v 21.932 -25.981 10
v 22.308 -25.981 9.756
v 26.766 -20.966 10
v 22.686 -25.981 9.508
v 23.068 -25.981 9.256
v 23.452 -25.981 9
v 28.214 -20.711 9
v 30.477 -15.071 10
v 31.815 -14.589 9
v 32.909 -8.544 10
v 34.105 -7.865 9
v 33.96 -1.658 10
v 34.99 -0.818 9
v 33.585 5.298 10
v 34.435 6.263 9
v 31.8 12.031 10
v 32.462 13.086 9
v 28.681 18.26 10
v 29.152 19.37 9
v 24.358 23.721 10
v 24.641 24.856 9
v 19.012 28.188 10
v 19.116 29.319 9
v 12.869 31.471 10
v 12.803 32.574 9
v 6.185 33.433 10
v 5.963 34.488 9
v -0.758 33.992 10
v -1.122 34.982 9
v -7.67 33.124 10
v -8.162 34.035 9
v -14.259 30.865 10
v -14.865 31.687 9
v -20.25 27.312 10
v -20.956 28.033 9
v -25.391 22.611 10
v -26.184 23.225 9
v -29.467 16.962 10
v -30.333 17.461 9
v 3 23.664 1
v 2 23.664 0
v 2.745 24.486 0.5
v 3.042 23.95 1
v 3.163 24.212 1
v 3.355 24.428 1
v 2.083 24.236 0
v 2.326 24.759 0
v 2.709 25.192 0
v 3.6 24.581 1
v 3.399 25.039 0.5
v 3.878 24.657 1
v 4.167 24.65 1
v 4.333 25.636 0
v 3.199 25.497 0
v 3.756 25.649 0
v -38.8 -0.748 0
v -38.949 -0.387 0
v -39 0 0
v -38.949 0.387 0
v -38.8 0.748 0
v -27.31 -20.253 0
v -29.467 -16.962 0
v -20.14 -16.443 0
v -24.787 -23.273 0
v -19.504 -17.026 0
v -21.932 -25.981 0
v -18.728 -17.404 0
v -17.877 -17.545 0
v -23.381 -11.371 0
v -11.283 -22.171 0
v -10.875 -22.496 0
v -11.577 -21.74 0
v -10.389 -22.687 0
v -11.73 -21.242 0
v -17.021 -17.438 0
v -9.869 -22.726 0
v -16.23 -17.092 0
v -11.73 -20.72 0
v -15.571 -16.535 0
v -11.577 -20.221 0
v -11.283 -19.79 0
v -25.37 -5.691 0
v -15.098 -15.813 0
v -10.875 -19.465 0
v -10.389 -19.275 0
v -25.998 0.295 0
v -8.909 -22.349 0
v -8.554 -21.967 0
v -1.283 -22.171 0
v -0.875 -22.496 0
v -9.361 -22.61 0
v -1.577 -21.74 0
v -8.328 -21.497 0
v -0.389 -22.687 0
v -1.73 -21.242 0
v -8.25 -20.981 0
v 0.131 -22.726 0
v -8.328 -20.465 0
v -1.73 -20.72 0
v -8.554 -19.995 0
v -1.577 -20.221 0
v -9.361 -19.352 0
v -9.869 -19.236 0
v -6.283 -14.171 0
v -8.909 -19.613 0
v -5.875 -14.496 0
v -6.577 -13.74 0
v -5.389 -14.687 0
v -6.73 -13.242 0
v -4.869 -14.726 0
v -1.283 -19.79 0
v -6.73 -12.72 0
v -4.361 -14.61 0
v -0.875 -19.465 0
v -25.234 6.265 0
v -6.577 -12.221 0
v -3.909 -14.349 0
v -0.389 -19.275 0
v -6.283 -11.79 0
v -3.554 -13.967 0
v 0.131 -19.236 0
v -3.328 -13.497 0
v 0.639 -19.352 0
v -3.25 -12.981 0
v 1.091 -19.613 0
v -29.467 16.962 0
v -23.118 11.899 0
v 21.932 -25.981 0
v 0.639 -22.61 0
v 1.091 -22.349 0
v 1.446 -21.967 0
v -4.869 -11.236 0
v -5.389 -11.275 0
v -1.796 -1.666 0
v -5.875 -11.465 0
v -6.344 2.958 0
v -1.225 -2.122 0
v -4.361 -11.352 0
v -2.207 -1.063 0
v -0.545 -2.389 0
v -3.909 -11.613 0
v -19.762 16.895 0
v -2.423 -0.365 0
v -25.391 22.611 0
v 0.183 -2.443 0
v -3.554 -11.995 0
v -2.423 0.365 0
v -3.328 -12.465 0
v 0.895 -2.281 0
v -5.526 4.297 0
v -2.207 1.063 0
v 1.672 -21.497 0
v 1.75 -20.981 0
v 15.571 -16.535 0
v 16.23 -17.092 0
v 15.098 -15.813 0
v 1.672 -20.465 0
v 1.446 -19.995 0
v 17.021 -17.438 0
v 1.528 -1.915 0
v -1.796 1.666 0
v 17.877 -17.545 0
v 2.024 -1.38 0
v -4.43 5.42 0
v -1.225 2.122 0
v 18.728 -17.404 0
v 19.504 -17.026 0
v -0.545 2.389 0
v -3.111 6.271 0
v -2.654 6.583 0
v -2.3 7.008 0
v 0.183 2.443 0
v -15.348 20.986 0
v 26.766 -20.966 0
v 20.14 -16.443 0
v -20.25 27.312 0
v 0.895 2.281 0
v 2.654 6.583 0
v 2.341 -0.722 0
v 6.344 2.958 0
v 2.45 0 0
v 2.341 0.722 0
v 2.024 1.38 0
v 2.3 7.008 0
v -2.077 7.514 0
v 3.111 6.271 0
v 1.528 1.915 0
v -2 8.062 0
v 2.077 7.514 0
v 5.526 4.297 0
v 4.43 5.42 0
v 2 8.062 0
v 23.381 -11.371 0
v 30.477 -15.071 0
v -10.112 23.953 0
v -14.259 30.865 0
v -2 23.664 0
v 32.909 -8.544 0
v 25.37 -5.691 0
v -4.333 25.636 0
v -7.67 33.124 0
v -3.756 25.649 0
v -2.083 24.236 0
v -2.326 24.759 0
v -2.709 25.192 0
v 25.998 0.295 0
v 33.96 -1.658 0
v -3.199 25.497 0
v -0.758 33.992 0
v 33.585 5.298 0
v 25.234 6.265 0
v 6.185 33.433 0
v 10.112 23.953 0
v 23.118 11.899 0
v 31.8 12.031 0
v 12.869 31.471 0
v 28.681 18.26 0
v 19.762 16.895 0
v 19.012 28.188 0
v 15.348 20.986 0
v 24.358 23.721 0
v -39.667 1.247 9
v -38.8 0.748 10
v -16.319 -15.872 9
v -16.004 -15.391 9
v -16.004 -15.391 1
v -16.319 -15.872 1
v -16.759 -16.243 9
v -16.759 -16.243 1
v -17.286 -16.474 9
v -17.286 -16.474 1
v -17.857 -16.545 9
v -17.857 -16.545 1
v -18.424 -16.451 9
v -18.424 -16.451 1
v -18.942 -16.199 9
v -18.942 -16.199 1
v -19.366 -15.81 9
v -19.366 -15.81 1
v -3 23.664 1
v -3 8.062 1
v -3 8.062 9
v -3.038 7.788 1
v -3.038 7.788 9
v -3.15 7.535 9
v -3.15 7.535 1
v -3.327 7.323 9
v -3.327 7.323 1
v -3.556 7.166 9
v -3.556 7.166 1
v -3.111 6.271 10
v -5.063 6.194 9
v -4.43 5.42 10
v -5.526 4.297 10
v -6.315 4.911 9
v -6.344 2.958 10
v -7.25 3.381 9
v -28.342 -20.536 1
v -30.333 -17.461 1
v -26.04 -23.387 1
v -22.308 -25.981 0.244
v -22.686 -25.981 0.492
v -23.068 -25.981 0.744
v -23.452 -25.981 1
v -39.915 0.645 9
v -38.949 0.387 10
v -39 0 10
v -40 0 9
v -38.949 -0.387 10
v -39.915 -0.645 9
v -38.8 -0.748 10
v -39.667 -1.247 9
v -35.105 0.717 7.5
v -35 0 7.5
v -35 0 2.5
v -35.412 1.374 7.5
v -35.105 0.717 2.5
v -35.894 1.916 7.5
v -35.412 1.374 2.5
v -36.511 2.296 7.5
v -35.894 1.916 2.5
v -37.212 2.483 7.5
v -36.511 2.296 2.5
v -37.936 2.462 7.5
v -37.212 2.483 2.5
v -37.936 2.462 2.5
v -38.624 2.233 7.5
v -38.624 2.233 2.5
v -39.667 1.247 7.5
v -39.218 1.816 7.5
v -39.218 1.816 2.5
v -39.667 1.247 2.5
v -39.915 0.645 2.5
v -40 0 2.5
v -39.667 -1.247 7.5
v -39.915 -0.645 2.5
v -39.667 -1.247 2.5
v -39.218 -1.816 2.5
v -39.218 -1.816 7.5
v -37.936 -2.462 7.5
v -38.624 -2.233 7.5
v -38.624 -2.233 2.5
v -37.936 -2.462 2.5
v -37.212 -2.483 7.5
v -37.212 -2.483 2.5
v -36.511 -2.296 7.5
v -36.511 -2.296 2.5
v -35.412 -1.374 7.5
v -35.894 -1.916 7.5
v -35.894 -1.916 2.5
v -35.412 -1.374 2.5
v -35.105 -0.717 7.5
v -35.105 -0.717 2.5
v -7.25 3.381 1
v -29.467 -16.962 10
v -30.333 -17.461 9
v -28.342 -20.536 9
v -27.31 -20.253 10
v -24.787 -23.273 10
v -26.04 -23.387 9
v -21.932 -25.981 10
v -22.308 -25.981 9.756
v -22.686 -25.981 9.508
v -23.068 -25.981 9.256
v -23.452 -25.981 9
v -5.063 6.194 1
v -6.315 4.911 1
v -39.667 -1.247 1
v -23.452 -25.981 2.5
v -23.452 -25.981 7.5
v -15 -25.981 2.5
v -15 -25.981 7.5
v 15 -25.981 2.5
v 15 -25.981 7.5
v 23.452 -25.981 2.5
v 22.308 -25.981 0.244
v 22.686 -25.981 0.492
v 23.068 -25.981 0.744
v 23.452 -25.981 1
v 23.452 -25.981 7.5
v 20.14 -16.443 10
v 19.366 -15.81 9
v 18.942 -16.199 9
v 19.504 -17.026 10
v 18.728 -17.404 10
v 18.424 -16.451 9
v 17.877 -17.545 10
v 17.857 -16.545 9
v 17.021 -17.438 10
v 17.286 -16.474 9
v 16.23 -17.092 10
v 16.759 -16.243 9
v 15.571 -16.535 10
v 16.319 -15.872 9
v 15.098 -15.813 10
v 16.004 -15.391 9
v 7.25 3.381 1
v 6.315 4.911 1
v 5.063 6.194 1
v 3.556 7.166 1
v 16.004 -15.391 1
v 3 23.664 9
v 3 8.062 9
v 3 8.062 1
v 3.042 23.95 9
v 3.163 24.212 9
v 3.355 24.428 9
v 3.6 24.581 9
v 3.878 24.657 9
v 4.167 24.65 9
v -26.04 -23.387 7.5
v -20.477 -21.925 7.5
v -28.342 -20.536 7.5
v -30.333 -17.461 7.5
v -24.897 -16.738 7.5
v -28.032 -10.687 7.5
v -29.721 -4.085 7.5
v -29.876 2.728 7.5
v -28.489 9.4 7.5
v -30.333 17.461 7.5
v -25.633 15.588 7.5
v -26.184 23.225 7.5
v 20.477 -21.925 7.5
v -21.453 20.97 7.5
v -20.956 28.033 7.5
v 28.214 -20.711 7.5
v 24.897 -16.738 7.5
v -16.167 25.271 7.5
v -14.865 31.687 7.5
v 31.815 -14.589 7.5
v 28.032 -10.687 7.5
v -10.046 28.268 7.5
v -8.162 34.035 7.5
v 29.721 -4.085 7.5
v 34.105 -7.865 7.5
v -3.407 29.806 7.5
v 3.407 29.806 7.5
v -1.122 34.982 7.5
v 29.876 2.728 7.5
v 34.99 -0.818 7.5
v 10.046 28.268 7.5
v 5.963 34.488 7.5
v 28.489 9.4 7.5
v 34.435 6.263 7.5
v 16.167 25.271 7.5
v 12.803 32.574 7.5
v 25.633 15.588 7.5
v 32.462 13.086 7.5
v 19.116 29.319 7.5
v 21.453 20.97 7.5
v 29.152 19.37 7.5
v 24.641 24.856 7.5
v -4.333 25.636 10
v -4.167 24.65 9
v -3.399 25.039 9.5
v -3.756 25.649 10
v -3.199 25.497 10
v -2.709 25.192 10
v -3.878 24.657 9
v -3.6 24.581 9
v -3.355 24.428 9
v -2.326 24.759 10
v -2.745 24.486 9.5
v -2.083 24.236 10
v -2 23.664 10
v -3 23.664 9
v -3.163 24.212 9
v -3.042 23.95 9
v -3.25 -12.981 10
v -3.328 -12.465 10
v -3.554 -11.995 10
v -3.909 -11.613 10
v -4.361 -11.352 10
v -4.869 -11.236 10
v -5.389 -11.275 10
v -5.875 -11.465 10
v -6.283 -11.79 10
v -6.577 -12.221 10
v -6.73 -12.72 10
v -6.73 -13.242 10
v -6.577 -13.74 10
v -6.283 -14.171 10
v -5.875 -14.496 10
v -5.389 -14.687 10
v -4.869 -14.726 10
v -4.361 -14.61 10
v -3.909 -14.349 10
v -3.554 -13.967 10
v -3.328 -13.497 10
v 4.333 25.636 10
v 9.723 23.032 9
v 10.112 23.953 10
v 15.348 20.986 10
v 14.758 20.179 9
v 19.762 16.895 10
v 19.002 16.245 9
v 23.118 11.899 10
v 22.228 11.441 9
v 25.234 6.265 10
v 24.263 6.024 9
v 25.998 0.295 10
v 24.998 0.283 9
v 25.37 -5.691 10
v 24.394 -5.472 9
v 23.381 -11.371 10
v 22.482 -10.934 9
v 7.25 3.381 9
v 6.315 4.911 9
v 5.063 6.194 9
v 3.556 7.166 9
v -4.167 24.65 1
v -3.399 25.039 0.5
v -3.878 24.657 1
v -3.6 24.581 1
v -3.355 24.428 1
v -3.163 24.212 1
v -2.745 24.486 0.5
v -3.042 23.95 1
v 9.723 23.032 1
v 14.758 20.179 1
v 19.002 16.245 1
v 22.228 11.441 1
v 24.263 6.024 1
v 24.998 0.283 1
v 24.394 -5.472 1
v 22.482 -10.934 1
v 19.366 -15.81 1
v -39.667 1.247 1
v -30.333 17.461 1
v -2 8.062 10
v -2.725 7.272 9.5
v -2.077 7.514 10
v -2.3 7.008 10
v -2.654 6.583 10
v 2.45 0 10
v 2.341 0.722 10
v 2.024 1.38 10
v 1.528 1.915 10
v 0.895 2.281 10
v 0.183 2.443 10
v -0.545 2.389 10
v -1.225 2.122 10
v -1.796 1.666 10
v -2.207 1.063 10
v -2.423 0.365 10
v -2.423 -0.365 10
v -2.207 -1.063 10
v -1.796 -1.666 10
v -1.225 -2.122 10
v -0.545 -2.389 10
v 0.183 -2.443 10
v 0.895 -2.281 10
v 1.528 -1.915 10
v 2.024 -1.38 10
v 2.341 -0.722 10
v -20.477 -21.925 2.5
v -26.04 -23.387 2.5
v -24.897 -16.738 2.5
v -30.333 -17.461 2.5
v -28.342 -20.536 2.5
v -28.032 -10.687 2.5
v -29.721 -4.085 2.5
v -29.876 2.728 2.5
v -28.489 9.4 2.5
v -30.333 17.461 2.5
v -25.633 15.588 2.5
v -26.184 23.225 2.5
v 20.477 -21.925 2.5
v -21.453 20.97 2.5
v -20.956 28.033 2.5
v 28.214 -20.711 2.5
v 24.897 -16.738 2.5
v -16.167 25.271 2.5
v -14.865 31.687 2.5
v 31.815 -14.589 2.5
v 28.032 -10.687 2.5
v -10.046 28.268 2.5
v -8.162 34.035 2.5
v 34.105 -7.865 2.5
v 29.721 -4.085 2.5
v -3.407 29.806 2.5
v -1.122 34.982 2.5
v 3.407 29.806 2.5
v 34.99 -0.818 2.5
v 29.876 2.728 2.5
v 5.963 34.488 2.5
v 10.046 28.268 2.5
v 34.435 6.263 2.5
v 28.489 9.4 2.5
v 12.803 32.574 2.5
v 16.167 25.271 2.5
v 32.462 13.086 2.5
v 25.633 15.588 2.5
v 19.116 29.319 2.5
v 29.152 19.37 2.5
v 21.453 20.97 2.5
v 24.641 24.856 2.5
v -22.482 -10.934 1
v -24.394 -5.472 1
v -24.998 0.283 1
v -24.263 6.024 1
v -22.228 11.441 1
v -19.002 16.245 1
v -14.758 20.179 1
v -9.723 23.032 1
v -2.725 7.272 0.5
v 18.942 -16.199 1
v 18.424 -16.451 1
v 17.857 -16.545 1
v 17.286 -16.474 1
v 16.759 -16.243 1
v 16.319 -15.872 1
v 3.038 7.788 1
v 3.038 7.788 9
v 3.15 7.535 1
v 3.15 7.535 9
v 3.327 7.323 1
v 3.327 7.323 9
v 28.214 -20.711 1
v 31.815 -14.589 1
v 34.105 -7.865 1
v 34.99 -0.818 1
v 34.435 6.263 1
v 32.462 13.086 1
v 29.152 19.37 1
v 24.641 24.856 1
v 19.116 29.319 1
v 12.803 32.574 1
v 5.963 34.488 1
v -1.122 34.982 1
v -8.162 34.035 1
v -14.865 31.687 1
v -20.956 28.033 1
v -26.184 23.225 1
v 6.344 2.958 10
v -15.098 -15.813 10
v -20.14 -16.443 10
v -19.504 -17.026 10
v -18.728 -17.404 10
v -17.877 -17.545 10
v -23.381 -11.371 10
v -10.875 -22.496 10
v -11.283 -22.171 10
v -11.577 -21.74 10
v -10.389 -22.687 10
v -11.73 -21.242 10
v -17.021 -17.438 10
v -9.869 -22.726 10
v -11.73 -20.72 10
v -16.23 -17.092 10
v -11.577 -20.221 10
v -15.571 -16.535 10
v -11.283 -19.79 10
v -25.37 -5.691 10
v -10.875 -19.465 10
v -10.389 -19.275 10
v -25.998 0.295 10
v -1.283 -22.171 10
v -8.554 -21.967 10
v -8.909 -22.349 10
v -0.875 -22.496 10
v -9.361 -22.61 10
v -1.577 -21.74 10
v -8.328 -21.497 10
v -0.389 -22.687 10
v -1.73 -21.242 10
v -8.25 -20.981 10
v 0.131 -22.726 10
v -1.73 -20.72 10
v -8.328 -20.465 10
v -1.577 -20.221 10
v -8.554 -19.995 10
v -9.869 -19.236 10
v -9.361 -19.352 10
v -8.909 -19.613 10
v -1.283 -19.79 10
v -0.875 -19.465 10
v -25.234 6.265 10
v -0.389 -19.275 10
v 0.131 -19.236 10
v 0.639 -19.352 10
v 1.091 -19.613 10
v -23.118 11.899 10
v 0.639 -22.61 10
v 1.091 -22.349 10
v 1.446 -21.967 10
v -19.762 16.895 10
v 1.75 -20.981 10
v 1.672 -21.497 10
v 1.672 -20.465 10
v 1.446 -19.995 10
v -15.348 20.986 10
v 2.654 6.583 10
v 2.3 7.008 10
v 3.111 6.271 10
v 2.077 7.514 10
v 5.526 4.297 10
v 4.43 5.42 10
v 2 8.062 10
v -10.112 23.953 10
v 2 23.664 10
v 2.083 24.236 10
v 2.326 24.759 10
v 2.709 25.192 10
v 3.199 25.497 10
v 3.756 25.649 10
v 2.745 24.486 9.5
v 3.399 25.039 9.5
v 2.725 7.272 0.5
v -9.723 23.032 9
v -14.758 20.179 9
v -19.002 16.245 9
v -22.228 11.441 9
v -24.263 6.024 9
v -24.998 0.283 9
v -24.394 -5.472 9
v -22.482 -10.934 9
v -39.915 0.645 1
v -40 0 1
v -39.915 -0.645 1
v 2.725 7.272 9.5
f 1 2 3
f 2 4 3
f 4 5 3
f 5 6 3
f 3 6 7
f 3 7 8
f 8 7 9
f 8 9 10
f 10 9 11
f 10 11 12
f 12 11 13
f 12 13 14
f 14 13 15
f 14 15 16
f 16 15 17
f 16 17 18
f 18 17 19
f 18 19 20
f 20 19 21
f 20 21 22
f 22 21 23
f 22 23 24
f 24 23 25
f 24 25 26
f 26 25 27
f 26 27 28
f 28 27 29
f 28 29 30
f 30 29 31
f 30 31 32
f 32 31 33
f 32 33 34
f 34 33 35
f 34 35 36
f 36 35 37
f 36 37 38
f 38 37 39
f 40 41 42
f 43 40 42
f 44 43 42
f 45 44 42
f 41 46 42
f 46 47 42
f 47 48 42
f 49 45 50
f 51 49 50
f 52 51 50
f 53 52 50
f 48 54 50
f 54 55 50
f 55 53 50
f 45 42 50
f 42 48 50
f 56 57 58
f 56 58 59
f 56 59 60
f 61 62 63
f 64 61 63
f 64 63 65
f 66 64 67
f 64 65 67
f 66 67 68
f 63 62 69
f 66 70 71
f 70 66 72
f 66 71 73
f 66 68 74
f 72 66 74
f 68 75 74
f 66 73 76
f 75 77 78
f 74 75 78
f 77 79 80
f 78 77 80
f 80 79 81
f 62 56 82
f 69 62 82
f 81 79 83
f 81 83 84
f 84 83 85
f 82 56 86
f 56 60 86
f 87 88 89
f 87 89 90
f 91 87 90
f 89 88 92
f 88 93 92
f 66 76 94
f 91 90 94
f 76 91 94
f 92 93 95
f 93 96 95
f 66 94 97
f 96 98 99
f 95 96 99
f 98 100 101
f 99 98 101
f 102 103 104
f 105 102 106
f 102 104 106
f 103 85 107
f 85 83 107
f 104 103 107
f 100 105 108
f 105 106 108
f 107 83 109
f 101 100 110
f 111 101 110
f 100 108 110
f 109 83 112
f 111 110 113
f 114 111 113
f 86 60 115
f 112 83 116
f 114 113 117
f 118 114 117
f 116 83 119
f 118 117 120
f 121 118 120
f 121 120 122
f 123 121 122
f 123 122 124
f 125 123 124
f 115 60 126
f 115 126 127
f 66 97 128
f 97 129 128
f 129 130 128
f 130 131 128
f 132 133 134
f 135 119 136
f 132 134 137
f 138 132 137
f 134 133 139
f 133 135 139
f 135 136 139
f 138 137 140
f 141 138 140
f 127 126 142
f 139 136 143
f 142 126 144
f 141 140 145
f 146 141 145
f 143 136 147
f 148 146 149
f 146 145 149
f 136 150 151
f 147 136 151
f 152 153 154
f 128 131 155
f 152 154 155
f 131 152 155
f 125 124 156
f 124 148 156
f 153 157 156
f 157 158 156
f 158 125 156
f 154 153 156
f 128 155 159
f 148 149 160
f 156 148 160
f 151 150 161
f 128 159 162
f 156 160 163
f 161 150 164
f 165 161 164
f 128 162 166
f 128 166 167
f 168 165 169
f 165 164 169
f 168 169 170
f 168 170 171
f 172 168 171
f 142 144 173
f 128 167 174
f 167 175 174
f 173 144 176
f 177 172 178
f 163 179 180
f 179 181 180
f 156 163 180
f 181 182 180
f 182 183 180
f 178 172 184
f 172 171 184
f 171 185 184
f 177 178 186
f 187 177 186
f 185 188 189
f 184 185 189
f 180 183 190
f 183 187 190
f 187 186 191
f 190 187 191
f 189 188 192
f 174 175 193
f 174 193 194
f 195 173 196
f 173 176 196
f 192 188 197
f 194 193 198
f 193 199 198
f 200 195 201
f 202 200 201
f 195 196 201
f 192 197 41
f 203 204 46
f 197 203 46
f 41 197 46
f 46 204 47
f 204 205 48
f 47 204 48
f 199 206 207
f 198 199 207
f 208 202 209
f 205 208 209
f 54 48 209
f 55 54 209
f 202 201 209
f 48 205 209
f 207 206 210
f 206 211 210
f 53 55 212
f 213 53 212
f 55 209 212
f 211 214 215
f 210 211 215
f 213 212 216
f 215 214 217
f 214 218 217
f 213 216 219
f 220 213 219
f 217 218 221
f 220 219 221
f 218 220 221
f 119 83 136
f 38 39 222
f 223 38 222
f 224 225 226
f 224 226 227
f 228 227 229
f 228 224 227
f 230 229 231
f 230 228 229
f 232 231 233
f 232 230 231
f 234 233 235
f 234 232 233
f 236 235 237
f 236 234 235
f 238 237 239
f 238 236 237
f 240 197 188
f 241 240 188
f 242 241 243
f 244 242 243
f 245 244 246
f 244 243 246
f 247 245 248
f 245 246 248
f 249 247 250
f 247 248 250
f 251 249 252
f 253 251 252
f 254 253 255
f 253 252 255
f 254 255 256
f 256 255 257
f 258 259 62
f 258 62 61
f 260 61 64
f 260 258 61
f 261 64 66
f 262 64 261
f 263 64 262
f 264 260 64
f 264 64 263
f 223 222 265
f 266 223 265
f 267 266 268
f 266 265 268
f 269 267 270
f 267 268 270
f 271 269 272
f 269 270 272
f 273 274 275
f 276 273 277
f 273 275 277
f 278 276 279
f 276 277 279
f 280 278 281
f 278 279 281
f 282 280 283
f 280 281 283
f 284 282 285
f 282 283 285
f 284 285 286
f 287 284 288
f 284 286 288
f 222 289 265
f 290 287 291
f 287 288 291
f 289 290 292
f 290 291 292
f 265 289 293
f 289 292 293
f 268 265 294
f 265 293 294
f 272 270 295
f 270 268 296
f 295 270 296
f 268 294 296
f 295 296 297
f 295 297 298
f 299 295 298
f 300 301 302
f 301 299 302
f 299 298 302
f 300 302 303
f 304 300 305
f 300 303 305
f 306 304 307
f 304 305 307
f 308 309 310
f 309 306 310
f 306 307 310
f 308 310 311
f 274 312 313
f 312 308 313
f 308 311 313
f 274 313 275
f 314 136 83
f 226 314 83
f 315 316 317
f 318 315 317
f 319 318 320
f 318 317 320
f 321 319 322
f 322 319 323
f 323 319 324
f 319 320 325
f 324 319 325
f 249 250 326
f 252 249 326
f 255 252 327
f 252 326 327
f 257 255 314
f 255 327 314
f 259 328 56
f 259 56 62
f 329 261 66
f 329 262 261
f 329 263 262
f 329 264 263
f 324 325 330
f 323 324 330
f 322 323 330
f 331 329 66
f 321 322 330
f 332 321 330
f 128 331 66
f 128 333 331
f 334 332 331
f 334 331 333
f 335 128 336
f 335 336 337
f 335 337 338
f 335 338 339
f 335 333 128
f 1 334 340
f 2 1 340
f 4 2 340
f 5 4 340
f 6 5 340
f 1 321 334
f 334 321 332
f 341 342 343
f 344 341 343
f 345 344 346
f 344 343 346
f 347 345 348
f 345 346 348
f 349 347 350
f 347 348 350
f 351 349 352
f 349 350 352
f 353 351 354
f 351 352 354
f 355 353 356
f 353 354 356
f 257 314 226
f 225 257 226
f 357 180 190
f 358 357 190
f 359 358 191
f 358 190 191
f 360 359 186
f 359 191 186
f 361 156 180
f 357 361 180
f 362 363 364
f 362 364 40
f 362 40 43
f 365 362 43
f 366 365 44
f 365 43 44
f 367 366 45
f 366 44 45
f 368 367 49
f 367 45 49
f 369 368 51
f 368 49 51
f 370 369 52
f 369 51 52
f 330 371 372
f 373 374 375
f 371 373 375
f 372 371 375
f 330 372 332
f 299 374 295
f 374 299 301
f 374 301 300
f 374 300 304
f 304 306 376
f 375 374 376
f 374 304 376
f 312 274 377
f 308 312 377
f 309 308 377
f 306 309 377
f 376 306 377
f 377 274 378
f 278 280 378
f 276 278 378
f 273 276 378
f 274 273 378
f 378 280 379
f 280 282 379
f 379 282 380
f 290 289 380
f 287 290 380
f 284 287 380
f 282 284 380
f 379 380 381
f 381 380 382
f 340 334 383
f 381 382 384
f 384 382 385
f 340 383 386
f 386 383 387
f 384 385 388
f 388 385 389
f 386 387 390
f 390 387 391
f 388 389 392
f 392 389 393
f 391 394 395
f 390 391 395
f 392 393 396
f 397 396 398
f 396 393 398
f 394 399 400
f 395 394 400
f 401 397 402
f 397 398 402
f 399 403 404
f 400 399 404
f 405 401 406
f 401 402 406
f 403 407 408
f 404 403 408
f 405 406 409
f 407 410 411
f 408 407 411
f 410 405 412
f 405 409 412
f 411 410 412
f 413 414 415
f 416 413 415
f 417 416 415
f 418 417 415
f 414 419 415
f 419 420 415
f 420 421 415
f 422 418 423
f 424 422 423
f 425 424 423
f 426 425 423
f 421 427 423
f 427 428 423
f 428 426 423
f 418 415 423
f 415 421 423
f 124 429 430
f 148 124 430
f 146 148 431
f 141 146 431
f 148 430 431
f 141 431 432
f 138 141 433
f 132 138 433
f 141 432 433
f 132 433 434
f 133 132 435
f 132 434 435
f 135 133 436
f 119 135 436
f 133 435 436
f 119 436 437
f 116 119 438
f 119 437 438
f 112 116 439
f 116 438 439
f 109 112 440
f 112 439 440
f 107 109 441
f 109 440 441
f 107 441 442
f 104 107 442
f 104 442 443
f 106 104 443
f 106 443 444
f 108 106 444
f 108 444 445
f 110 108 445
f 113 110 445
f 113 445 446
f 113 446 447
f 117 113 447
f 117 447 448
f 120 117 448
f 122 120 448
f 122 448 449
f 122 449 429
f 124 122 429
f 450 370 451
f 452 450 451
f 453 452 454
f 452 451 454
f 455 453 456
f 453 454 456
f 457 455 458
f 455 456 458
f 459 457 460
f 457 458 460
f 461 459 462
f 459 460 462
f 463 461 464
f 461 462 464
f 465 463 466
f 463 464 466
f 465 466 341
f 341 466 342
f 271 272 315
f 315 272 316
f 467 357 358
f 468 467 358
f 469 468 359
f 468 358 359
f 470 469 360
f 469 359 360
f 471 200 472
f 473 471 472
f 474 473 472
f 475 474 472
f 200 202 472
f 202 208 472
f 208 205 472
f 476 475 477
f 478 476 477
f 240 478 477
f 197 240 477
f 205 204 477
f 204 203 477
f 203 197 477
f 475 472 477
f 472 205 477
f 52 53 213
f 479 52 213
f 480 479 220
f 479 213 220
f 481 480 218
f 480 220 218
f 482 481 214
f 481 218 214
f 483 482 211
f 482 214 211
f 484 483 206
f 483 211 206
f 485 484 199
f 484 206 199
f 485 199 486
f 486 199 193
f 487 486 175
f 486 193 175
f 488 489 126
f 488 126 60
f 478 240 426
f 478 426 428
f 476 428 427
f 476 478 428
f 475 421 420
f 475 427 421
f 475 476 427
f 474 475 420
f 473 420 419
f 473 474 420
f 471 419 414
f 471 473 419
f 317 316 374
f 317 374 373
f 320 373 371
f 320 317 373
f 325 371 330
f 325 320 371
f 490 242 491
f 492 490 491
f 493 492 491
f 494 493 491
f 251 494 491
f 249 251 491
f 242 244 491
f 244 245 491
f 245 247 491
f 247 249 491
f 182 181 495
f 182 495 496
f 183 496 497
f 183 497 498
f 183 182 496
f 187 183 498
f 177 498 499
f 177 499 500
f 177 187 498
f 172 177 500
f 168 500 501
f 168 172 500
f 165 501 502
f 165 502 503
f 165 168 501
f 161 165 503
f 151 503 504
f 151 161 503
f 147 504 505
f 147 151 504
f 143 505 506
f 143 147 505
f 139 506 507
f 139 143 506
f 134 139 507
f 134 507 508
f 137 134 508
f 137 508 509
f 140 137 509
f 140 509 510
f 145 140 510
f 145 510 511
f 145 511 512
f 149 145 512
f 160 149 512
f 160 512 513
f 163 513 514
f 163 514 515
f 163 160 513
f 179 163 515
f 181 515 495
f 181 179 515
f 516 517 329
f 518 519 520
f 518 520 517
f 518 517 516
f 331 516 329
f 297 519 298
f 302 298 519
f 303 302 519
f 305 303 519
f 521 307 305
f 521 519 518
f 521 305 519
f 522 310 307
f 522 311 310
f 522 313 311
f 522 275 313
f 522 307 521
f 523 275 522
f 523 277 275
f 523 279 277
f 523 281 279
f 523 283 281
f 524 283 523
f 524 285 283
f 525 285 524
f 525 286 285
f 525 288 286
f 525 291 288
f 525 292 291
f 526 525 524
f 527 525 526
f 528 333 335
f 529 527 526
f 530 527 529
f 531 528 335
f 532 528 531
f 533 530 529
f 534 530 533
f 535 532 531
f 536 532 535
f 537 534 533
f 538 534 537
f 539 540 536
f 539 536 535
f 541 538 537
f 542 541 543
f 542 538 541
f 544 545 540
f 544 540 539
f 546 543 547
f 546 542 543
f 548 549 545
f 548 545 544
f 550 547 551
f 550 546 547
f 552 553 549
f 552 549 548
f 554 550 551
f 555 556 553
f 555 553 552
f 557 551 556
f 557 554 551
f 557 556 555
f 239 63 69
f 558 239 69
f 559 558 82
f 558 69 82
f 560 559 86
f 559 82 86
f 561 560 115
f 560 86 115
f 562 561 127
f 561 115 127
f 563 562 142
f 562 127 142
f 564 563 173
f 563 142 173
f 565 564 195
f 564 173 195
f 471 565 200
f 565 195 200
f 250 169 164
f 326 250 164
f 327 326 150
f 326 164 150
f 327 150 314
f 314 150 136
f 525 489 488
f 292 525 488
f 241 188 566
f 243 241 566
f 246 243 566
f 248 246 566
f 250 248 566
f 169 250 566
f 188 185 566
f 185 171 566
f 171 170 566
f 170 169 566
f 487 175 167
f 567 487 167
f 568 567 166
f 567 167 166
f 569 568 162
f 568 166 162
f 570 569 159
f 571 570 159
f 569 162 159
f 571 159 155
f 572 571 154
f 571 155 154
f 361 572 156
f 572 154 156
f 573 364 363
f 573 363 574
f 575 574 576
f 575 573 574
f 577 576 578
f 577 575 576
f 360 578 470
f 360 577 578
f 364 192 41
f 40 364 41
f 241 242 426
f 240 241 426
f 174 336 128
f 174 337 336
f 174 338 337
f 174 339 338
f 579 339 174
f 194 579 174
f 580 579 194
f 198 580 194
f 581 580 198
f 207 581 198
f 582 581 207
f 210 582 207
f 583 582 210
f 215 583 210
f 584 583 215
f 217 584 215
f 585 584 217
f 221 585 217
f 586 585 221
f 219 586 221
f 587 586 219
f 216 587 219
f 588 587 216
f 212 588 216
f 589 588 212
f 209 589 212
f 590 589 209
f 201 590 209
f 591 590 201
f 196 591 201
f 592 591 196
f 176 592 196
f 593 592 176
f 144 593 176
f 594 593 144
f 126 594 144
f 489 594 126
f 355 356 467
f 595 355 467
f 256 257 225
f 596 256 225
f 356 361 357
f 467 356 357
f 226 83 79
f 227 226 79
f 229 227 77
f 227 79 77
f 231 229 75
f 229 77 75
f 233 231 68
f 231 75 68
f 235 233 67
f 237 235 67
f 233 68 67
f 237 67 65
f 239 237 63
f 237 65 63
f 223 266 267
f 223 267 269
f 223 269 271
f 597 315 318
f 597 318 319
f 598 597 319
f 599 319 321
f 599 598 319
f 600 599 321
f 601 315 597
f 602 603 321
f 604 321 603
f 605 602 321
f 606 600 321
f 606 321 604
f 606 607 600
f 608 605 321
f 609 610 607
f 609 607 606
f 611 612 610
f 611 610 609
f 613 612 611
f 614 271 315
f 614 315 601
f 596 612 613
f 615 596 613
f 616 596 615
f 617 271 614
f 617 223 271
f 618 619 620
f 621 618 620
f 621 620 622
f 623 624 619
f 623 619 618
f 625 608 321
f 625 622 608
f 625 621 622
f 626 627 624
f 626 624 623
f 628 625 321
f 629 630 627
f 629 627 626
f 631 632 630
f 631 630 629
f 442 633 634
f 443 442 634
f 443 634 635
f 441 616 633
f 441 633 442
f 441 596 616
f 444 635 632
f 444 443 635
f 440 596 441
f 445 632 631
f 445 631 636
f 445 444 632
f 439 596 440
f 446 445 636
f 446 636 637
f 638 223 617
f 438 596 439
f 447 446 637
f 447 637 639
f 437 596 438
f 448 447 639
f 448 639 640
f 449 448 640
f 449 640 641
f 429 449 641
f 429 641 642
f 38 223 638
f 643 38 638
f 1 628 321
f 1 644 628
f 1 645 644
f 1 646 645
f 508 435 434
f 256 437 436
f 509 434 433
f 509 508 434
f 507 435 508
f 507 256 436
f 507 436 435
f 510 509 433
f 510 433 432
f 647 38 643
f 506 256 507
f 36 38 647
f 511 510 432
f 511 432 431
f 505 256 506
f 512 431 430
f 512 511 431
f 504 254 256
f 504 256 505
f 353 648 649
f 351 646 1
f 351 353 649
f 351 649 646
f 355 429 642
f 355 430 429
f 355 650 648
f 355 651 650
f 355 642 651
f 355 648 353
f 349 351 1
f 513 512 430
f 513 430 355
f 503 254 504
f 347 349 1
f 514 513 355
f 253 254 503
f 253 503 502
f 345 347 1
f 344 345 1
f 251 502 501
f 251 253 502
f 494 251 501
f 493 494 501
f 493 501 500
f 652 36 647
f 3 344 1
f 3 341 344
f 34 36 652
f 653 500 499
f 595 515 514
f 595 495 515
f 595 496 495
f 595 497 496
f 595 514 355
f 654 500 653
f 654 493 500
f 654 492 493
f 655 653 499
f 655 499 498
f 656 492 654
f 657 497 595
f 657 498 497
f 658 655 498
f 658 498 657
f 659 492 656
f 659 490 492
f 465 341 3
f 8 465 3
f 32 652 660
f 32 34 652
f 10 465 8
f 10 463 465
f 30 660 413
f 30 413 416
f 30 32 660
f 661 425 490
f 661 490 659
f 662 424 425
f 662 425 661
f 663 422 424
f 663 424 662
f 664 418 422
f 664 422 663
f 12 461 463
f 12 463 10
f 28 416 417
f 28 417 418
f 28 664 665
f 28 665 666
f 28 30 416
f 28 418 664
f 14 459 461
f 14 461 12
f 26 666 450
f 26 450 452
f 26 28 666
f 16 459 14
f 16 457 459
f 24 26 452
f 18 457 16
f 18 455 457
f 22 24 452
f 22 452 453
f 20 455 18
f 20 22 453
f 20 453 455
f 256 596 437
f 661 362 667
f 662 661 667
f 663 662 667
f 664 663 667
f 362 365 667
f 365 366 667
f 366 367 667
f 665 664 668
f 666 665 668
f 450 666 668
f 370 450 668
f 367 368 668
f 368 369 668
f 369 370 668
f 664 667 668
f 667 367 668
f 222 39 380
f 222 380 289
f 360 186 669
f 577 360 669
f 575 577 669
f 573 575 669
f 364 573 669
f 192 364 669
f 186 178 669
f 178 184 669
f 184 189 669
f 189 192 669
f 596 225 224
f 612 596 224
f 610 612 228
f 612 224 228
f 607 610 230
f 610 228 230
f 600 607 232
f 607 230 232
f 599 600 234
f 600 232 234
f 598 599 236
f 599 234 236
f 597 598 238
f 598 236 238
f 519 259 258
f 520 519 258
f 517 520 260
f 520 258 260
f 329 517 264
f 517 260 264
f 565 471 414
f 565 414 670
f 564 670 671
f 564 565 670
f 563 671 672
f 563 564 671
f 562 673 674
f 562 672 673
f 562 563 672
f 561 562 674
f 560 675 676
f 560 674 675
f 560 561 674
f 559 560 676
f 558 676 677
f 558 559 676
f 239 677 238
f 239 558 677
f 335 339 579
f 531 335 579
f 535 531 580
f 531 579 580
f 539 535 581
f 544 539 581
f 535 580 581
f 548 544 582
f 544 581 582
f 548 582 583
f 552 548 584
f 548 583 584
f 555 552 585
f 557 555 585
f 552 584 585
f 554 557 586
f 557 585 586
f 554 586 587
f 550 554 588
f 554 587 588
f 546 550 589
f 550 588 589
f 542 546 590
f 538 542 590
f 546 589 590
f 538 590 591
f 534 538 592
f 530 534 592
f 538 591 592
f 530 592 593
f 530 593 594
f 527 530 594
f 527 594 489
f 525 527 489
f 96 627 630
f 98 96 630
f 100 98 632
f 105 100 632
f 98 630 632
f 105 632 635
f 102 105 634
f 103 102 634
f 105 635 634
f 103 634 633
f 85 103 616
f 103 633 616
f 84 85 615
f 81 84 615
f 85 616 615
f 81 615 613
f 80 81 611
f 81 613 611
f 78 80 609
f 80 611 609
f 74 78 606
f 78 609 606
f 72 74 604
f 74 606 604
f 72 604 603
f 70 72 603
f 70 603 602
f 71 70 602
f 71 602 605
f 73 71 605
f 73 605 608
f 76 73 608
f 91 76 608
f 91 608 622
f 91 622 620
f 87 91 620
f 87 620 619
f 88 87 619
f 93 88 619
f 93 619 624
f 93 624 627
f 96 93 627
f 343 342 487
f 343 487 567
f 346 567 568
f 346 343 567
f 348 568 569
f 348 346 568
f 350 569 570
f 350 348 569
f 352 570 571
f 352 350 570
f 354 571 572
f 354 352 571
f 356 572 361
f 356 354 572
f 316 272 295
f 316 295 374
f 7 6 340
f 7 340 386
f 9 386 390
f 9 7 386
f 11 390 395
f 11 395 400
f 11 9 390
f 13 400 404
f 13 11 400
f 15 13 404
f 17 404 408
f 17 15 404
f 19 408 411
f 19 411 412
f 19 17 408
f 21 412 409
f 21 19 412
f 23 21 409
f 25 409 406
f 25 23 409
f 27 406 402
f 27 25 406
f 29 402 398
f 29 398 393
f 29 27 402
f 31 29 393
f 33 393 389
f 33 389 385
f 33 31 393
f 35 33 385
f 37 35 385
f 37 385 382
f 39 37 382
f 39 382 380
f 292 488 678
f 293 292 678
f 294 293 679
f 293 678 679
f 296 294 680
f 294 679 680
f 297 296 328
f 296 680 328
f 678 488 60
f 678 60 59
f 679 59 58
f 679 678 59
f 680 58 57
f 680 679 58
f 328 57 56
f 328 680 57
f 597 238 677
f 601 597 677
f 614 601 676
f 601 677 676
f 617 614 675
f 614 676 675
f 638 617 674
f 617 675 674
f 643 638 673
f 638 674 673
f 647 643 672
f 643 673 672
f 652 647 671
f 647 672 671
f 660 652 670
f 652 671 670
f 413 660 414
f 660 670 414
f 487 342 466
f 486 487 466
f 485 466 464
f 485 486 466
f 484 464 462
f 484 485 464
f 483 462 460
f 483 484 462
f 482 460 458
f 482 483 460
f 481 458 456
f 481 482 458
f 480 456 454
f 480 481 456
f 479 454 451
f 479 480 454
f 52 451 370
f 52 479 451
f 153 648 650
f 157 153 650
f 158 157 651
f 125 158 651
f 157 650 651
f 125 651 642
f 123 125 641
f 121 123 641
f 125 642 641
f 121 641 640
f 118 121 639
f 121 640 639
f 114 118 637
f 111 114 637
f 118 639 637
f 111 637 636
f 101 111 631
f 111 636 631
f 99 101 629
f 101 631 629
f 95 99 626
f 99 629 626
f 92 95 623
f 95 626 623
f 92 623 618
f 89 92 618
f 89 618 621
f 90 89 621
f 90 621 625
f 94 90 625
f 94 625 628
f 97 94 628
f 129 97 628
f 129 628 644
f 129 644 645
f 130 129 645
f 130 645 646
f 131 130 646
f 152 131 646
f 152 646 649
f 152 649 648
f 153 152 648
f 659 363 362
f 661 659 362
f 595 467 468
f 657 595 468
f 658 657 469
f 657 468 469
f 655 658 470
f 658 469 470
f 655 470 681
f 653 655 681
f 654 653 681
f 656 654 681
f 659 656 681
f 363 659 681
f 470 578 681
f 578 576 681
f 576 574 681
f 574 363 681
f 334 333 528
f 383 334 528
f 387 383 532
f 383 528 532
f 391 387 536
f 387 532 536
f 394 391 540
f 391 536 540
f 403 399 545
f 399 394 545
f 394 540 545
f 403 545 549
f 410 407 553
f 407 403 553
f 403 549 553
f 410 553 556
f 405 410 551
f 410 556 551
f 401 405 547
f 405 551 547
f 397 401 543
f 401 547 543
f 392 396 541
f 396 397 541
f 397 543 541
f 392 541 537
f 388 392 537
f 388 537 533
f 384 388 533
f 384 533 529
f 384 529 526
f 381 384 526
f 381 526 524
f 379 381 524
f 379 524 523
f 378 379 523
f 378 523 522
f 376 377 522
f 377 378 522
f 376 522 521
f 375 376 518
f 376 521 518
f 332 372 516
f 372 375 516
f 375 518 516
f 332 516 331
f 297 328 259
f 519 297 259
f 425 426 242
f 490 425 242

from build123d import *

# Parameters (mm, degrees)
EXTRUDE_1_DEPTH     = 10
SKETCH_2_R          = 2.45
EXTRUDE_2_DEPTH     = 10
SKETCH_3_R          = 1.75
CUT_EXTRUDE_1_DEPTH = 11
EXTRUDE_3_DEPTH     = 2.5
EXTRUDE_4_DEPTH     = 2.5
EXTRUDE_5_REACH     = 9.5
SKETCH_6_R          = 2.5
FILLET_1_R          = 2
SKETCH_7_W          = 6
SKETCH_7_H          = 22
EXTRUDE_6_DEPTH     = 10
FILLET_2_R          = 1
CHAMFER_1_SIZE      = 1
CHAMFER_2_SIZE      = 1
SKETCH_8_R          = 1.75
CUT_EXTRUDE_2_DEPTH = 11


with BuildPart() as part:
    # ｽｹｯﾁ1 → ﾎﾞｽ - 押し出し1 (new body)
    with BuildSketch(Plane.XY):
        with BuildLine():
            Line((-15, -25.980762114), (15, -25.980762114))
            ThreePointArc((15, -25.980762114), (0, 30), (-15, -25.980762114))
        make_face()
        with BuildLine():
            Line((-13.594396682, -20.980762114), (13.594396682, -20.980762114))
            ThreePointArc((13.594396682, -20.980762114), (0, 25), (-13.594396682, -20.980762114))
        make_face(mode=Mode.SUBTRACT)
    extrude(amount=EXTRUDE_1_DEPTH)

    # ｽｹｯﾁ2 → ﾎﾞｽ - 押し出し2 (add)
    with BuildSketch(Plane.XY):
        with BuildLine():
            Line((-13.594396682, -20.980762114), (13.594396682, -20.980762114))
            ThreePointArc((13.594396682, -20.980762114), (15.495156387, -19.618871745), (17.260361171, -18.085351317))
            Line((17.260361171, -18.085351317), (7.250462296, 3.380946094))
            ThreePointArc((7.250462296, 3.380946094), (0, 8), (-7.250462296, 3.380946094))
            Line((-7.250462296, 3.380946094), (-17.260361171, -18.085351317))
            ThreePointArc((-17.260361171, -18.085351317), (-15.495156387, -19.618871745), (-13.594396682, -20.980762114))
        make_face()
        Circle(SKETCH_2_R, mode=Mode.SUBTRACT)
    extrude(amount=EXTRUDE_2_DEPTH)

    # ｽｹｯﾁ3 → ｶｯﾄ - 押し出し1 (cut, through all)
    with BuildSketch(Plane.XY.offset(10)):
        with Locations((0, -20.980762114)):
            Circle(SKETCH_3_R)
        with Locations((-10, -20.980762114)):
            Circle(SKETCH_3_R)
    extrude(amount=-CUT_EXTRUDE_1_DEPTH, mode=Mode.SUBTRACT)

    # ｽｹｯﾁ4 → ﾎﾞｽ - 押し出し3 (add)
    with BuildSketch(Plane.XY):
        with BuildLine():
            Line((-23.452078799, -25.980762114), (-15, -25.980762114))
            ThreePointArc((-15, -25.980762114), (0, 30), (15, -25.980762114))
            Line((15, -25.980762114), (23.452078799, -25.980762114))
            ThreePointArc((23.452078799, -25.980762114), (0, 35), (-23.452078799, -25.980762114))
        make_face()
    extrude_3 = extrude(amount=EXTRUDE_3_DEPTH)

    # ｽｹｯﾁ5 → ﾎﾞｽ - 押し出し4 (add)
    with BuildSketch(Plane.XY):
        with BuildLine():
            Line((-30.333333333, 17.461067805), (-39.666666667, 1.247219129))
            ThreePointArc((-39.666666667, 1.247219129), (-40, 0), (-39.666666667, -1.247219129))
            Line((-39.666666667, -1.247219129), (-30.333333333, -17.461067805))
            Line((-30.333333333, -17.461067805), (-30.333333333, 17.461067805))
        make_face()
    extrude_4 = extrude(amount=EXTRUDE_4_DEPTH)

    # ﾐﾗｰ2: ﾎﾞｽ - 押し出し3, ﾎﾞｽ - 押し出し4 across plane
    add(extrude_3.mirror(Plane(origin=(0, 0, 5), x_dir=(1, 0, 0), z_dir=(0, 0, -1))))
    add(extrude_4.mirror(Plane(origin=(0, 0, 5), x_dir=(1, 0, 0), z_dir=(0, 0, -1))))

    # ｽｹｯﾁ6 → ﾎﾞｽ - 押し出し5 (add, up to next)
    with BuildSketch(Plane.XY.offset(2.5), mode=Mode.PRIVATE) as extrude_5_sk1:
        with Locations((-37.5, 0)):
            Circle(SKETCH_6_R)
    extrude_5_tool1 = extrude(extrude_5_sk1.sketch, amount=EXTRUDE_5_REACH, mode=Mode.PRIVATE) - part.part
    add(extrude_5_tool1.solids().sort_by_distance((-37.5, 0, 2.5))[0])

    # ﾌｨﾚｯﾄ1
    fillet_1_edges = [part.edges().sort_by_distance(p)[0] for p in [
        (-17.260361171, -18.085351317, 5),
        (17.260361171, -18.085351317, 5),
    ]]
    fillet(fillet_1_edges, radius=FILLET_1_R)

    # ｽｹｯﾁ7 → ﾎﾞｽ - 押し出し6 (add)
    with BuildSketch(Plane.XY.offset(10)):
        with Locations((0, 16)):
            Rectangle(SKETCH_7_W, SKETCH_7_H)
    extrude(amount=-EXTRUDE_6_DEPTH)

    # ﾌｨﾚｯﾄ2
    fillet_2_edges = [part.edges().sort_by_distance(p)[0] for p in [
        (3, 7.416198487, 5),
        (-3, 7.416198487, 5),
        (-3, 24.819347292, 5),
        (3, 24.819347292, 5),
    ]]
    fillet(fillet_2_edges, radius=FILLET_2_R)

    # 面取り1
    chamfer_1_edges = [part.edges().sort_by_distance(p)[0] for p in [
        (11.627163615, -6.004920172, 0),
        (11.627163615, -6.004920172, 10),
        (23.403223211, 8.791424421, 0),
        (23.403223211, 8.791424421, 10),
        (17.568783294, -16.530152165, 0),
        (17.568783294, -16.530152165, 10),
        (-17.568783294, -16.530152165, 0),
        (-17.568783294, -16.530152165, 10),
        (-3, 15.86328844, 10),
        (-3, 15.86328844, 0),
        (-23.403223211, 8.791424421, 10),
        (-23.403223211, 8.791424421, 0),
        (3, 15.86328844, 0),
        (3, 15.86328844, 10),
        (-5.724946981, 5.587931824, 10),
        (-5.724946981, 5.587931824, 0),
        (-3.354502776, 24.428081748, 0),
        (-3.354502776, 24.428081748, 10),
        (3.354502776, 24.428081748, 10),
        (3.354502776, 24.428081748, 0),
        (3.150163414, 7.535211472, 10),
        (3.150163414, 7.535211472, 0),
        (-3.150163414, 7.535211472, 0),
        (-3.150163414, 7.535211472, 10),
        (5.724946981, 5.587931824, 10),
        (-11.627163615, -6.004920172, 10),
        (5.724946981, 5.587931824, 0),
        (-11.627163615, -6.004920172, 0),
    ]]
    chamfer(chamfer_1_edges, length=CHAMFER_1_SIZE)

    # 面取り2
    chamfer_2_edges = [part.edges().sort_by_distance(p)[0] for p in [
        (21.991727141, 27.227999143, 0),
        (-27.227999143, -21.991727141, 0),
        (-35, 9.354143467, 0),
        (-40, 0, 0),
        (-35, -9.354143467, 0),
        (21.991727141, 27.227999143, 10),
        (-27.227999143, -21.991727141, 10),
        (-35, 9.354143467, 10),
        (-40, 0, 10),
        (-35, -9.354143467, 10),
    ]]
    chamfer(chamfer_2_edges, length=CHAMFER_2_SIZE)

    # ｽｹｯﾁ8 → ｶｯﾄ - 押し出し2 (cut, through all)
    with BuildSketch(Plane.XY.offset(10)):
        with Locations((-5, -12.980762114)):
            Circle(SKETCH_8_R)
    extrude(amount=-CUT_EXTRUDE_2_DEPTH, mode=Mode.SUBTRACT)


solid = part.part
